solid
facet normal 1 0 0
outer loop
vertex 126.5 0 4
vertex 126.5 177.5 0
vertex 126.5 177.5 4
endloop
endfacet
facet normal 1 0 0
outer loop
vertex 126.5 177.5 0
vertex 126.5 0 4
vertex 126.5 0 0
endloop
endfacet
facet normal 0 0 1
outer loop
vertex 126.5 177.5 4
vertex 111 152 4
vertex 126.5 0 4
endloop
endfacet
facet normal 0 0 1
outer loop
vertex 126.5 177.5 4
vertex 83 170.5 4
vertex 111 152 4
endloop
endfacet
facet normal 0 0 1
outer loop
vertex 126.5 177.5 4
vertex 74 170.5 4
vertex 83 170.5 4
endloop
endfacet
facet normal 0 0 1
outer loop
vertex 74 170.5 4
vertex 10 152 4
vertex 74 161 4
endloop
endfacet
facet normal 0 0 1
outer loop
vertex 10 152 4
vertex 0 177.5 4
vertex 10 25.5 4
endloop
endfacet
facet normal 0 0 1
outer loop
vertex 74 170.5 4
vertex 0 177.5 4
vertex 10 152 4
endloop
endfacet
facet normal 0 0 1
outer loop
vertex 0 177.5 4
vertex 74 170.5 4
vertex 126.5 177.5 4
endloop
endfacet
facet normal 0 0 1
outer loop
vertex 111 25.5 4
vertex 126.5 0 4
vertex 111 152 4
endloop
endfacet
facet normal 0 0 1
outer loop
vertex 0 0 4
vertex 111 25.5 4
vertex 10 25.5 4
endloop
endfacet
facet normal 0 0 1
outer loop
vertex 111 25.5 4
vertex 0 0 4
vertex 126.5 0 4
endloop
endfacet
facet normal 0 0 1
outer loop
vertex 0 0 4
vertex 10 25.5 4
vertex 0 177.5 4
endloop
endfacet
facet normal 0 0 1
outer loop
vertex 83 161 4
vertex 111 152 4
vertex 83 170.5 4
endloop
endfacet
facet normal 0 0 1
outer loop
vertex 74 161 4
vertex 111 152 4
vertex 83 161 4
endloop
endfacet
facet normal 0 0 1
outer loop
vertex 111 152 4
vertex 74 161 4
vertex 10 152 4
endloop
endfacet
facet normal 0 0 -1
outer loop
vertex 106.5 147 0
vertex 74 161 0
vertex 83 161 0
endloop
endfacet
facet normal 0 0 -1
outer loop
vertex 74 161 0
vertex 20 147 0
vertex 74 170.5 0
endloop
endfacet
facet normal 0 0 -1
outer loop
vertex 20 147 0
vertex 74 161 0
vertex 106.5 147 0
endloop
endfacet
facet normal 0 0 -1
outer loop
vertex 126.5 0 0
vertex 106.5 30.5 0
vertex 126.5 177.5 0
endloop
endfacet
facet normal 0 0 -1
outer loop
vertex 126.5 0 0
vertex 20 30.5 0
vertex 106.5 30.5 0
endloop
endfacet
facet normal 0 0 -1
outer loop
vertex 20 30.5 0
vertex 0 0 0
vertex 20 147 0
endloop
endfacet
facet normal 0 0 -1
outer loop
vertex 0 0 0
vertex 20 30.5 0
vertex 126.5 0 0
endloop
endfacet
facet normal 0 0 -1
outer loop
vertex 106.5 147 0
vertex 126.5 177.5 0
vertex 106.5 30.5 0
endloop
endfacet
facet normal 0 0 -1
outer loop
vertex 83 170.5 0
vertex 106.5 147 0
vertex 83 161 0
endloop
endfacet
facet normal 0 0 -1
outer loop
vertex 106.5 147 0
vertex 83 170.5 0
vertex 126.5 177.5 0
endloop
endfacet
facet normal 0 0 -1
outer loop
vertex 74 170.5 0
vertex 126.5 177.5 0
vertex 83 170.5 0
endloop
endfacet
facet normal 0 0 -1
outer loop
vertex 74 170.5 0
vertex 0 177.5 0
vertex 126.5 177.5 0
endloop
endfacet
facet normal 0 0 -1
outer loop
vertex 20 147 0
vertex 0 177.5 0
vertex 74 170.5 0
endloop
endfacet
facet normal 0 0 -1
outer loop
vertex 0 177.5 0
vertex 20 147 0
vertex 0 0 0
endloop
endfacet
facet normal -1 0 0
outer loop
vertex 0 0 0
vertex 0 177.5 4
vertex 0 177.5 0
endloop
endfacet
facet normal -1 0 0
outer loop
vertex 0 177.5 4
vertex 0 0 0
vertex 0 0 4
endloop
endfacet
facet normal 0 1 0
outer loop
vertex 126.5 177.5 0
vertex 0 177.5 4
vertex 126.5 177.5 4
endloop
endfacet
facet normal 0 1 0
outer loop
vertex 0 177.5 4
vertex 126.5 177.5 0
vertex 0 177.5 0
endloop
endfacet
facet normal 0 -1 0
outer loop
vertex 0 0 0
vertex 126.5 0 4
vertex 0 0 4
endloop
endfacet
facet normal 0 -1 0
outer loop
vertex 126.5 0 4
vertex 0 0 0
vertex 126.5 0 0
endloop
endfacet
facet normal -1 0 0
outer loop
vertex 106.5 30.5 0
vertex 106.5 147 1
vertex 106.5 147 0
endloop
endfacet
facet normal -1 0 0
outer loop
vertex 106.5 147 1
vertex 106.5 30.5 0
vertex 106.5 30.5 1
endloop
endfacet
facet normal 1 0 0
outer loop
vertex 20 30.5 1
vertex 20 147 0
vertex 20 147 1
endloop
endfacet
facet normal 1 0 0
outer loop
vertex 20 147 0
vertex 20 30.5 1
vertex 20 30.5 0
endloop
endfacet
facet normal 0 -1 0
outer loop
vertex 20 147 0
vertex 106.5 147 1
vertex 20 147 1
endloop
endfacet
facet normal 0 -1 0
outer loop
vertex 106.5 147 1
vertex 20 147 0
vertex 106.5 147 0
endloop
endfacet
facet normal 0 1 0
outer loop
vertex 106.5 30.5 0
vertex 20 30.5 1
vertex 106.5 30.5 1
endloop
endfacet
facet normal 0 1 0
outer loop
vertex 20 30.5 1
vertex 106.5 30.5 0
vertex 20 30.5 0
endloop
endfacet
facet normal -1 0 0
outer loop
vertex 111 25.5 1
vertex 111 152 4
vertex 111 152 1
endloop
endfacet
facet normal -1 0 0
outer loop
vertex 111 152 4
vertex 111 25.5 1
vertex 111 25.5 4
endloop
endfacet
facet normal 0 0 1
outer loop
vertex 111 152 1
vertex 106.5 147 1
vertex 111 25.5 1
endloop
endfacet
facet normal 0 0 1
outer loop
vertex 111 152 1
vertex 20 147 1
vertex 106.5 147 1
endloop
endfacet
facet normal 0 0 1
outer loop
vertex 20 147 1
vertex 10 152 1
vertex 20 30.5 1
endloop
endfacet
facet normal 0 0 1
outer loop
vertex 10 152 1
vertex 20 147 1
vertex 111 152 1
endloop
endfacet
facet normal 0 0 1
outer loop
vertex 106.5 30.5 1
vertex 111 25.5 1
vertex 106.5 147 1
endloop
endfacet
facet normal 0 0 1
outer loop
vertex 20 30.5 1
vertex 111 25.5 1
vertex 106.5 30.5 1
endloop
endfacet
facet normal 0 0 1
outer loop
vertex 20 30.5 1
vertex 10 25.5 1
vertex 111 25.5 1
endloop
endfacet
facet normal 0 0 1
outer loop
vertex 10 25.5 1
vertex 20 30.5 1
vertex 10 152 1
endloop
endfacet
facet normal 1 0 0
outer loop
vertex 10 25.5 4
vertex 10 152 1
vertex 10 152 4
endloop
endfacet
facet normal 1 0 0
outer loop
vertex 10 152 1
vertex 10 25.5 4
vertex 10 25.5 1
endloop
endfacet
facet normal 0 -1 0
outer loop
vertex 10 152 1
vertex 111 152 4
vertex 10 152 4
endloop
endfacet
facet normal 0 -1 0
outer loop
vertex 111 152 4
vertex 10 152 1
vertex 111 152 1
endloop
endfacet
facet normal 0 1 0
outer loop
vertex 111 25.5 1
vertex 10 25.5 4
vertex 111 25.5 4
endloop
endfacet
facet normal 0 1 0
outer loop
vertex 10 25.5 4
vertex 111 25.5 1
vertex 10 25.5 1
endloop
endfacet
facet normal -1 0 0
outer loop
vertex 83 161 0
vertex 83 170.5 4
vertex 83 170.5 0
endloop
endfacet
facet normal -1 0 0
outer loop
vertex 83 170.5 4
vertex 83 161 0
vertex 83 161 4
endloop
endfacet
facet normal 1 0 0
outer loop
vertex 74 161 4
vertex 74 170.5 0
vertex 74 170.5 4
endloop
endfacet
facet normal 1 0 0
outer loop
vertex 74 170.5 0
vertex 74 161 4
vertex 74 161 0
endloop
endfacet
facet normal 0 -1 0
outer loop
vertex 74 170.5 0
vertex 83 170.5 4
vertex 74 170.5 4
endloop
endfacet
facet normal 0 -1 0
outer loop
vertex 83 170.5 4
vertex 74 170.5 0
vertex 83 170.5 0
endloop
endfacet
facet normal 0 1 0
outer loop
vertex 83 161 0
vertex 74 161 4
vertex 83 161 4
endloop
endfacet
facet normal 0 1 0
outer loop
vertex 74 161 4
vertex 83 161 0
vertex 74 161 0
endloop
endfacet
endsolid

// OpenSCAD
frame_w = 126.5;
frame_h = 177.5;
frame_t = 5.1;

screen_w = 101;
screen_h = 126.5;
screen_t = 3;

screen_margin_l = 4.5;
screen_margin_r = 10;
screen_margin_t = 5;
screen_margin_b = 5;

camera = true;
camera_inset = 7;
camera_w = 9;
camera_h = 9.5;

// These are physical measurements of the RPi
standoff_y_sep = 58;
standoff_x_sep = 49;


aperture_w = screen_w - screen_margin_l - screen_margin_r;
aperture_h = screen_h - screen_margin_t - screen_margin_b;

aperture_offset_x = (frame_w - aperture_w) / 2;
aperture_offset_y = (frame_h - aperture_h) / 2;

recess_offset_x = aperture_offset_x - screen_margin_r;
recess_offset_y = aperture_offset_y - screen_margin_b;

bottom_t = 1;

back_t = frame_t - screen_t - bottom_t;

button_xs = [26, 47, 69, 90];
standoff_bottom_y = 66.5;
standoff_ys = [standoff_bottom_y, standoff_bottom_y + standoff_y_sep];


button_hole_w = 10;
button_hole_h = 8;
button_hole_bottom_y = 22;

button_extender_gap = 5;
button_extender_w = button_hole_w - 3;
button_extender_inner_w = button_extender_w - 3;

module mount() {
    difference() {
        cube([frame_w, frame_h, screen_t + bottom_t]);
        translate([aperture_offset_x, aperture_offset_y, -1]) {
            cube([aperture_w, aperture_h, 10]);
        };
        translate([recess_offset_x, recess_offset_y, bottom_t]) {
            cube([screen_w, screen_h, 10]);
        };
        camera_hole();
    }
}

module camera_hole() {
    if (camera) {
        translate([74, frame_h - camera_inset - camera_h, -1]) {
            cube([camera_w, camera_h, frame_t + 2]);
        }
    }
}

module eq_tri_prism(width, height) {
    linear_extrude(height) {
        polygon(points=[[0, 0], [width, 0], [width / 2, width * sin(60)]]);
    }
}

module button_extender_duct(len, wid, inner_wid) {
    // Using triangles because they should be ok to print without support
    rotate([90, 0, 0]) {
        difference() {
            // casing
            eq_tri_prism(wid, len);
            // hole
            translate([(wid - inner_wid) / 2, 0, -1]){
                eq_tri_prism(inner_wid, len+2);
            }
            // flatten the top
            translate([0, inner_wid * sin(60) + 1, -1]) {
                cube([10, 10, len + 2]);
            }
        }
    }
}

module button_extender_shaft(len, wid, chamfer_angle=60) {
    end_wid = 0.6 * button_hole_w;
    height = wid * sin(60);
    difference() {
        union() {
            // triangular prism shaft
            rotate([90, 0, 0]) {
                eq_tri_prism(wid, len);
            }
            // cuboid end
            translate([(wid - end_wid) / 2, 0, 0]){
                cube([end_wid, button_extender_gap + 2, height]);
            }
        }
        // chamfer on end of shaft
        translate([0, -len, 0]) {
            rotate([chamfer_angle, 0, 0]) {
                chamfer_length = height / sin(chamfer_angle);
                cube([wid, chamfer_length, wid]);
            }
        }

    }
}

module back_cover() {
    difference() {
        cube([frame_w, frame_h, back_t]);

        // GPIO breakout
        translate([11.5, 117, -1]) cube([14, 34, back_t + 2]);

        // central components & ribbon cable
        translate([22.5, 75, -1]) cube([30.5, 27, back_t + 2]);

        // standoffs
        for (y = standoff_ys) {
            translate([41, y, -1]) cylinder(back_t + 2, d=8, $fn=32);
        }

        // button holes
        for (x = button_xs) {
            translate([x, button_hole_bottom_y, -1]) cube([button_hole_w, button_hole_h, back_t + 2]);
        }

        // Pi Zero
        translate([60, 59, -1]) cube([37, 73, back_t + 2]);

        // Camera hole
        camera_hole();
    }
    for (x = button_xs) {
        translate([x + (button_hole_w - button_extender_w) / 2, button_hole_bottom_y - button_extender_gap, back_t]){
            button_extender_duct(
                len=button_hole_bottom_y - button_extender_gap,
                wid=button_extender_w,
                inner_wid=button_extender_inner_w
            );
        }
    }
}

module spacer() {
    outer_dia = 8;
    inner_dia = 3;
    countersink_dia = 5.8;
    countersink_depth = 4;
    thickness = 1;

    difference() {
        cylinder(d=outer_dia, h=countersink_depth + thickness, $fn=6);
        translate([0, 0, -1]) cylinder(d=inner_dia, h=countersink_depth + thickness + 1, $fn=32);
        translate([0, 0, thickness]) cylinder(d=countersink_dia, h=countersink_depth + 1, $fn=6);
    }
}

mount();

//translate([frame_w + 20, 0, 0])

//back_cover();

//button_extender_shaft(30, button_extender_inner_w - 1);

//spacer();
